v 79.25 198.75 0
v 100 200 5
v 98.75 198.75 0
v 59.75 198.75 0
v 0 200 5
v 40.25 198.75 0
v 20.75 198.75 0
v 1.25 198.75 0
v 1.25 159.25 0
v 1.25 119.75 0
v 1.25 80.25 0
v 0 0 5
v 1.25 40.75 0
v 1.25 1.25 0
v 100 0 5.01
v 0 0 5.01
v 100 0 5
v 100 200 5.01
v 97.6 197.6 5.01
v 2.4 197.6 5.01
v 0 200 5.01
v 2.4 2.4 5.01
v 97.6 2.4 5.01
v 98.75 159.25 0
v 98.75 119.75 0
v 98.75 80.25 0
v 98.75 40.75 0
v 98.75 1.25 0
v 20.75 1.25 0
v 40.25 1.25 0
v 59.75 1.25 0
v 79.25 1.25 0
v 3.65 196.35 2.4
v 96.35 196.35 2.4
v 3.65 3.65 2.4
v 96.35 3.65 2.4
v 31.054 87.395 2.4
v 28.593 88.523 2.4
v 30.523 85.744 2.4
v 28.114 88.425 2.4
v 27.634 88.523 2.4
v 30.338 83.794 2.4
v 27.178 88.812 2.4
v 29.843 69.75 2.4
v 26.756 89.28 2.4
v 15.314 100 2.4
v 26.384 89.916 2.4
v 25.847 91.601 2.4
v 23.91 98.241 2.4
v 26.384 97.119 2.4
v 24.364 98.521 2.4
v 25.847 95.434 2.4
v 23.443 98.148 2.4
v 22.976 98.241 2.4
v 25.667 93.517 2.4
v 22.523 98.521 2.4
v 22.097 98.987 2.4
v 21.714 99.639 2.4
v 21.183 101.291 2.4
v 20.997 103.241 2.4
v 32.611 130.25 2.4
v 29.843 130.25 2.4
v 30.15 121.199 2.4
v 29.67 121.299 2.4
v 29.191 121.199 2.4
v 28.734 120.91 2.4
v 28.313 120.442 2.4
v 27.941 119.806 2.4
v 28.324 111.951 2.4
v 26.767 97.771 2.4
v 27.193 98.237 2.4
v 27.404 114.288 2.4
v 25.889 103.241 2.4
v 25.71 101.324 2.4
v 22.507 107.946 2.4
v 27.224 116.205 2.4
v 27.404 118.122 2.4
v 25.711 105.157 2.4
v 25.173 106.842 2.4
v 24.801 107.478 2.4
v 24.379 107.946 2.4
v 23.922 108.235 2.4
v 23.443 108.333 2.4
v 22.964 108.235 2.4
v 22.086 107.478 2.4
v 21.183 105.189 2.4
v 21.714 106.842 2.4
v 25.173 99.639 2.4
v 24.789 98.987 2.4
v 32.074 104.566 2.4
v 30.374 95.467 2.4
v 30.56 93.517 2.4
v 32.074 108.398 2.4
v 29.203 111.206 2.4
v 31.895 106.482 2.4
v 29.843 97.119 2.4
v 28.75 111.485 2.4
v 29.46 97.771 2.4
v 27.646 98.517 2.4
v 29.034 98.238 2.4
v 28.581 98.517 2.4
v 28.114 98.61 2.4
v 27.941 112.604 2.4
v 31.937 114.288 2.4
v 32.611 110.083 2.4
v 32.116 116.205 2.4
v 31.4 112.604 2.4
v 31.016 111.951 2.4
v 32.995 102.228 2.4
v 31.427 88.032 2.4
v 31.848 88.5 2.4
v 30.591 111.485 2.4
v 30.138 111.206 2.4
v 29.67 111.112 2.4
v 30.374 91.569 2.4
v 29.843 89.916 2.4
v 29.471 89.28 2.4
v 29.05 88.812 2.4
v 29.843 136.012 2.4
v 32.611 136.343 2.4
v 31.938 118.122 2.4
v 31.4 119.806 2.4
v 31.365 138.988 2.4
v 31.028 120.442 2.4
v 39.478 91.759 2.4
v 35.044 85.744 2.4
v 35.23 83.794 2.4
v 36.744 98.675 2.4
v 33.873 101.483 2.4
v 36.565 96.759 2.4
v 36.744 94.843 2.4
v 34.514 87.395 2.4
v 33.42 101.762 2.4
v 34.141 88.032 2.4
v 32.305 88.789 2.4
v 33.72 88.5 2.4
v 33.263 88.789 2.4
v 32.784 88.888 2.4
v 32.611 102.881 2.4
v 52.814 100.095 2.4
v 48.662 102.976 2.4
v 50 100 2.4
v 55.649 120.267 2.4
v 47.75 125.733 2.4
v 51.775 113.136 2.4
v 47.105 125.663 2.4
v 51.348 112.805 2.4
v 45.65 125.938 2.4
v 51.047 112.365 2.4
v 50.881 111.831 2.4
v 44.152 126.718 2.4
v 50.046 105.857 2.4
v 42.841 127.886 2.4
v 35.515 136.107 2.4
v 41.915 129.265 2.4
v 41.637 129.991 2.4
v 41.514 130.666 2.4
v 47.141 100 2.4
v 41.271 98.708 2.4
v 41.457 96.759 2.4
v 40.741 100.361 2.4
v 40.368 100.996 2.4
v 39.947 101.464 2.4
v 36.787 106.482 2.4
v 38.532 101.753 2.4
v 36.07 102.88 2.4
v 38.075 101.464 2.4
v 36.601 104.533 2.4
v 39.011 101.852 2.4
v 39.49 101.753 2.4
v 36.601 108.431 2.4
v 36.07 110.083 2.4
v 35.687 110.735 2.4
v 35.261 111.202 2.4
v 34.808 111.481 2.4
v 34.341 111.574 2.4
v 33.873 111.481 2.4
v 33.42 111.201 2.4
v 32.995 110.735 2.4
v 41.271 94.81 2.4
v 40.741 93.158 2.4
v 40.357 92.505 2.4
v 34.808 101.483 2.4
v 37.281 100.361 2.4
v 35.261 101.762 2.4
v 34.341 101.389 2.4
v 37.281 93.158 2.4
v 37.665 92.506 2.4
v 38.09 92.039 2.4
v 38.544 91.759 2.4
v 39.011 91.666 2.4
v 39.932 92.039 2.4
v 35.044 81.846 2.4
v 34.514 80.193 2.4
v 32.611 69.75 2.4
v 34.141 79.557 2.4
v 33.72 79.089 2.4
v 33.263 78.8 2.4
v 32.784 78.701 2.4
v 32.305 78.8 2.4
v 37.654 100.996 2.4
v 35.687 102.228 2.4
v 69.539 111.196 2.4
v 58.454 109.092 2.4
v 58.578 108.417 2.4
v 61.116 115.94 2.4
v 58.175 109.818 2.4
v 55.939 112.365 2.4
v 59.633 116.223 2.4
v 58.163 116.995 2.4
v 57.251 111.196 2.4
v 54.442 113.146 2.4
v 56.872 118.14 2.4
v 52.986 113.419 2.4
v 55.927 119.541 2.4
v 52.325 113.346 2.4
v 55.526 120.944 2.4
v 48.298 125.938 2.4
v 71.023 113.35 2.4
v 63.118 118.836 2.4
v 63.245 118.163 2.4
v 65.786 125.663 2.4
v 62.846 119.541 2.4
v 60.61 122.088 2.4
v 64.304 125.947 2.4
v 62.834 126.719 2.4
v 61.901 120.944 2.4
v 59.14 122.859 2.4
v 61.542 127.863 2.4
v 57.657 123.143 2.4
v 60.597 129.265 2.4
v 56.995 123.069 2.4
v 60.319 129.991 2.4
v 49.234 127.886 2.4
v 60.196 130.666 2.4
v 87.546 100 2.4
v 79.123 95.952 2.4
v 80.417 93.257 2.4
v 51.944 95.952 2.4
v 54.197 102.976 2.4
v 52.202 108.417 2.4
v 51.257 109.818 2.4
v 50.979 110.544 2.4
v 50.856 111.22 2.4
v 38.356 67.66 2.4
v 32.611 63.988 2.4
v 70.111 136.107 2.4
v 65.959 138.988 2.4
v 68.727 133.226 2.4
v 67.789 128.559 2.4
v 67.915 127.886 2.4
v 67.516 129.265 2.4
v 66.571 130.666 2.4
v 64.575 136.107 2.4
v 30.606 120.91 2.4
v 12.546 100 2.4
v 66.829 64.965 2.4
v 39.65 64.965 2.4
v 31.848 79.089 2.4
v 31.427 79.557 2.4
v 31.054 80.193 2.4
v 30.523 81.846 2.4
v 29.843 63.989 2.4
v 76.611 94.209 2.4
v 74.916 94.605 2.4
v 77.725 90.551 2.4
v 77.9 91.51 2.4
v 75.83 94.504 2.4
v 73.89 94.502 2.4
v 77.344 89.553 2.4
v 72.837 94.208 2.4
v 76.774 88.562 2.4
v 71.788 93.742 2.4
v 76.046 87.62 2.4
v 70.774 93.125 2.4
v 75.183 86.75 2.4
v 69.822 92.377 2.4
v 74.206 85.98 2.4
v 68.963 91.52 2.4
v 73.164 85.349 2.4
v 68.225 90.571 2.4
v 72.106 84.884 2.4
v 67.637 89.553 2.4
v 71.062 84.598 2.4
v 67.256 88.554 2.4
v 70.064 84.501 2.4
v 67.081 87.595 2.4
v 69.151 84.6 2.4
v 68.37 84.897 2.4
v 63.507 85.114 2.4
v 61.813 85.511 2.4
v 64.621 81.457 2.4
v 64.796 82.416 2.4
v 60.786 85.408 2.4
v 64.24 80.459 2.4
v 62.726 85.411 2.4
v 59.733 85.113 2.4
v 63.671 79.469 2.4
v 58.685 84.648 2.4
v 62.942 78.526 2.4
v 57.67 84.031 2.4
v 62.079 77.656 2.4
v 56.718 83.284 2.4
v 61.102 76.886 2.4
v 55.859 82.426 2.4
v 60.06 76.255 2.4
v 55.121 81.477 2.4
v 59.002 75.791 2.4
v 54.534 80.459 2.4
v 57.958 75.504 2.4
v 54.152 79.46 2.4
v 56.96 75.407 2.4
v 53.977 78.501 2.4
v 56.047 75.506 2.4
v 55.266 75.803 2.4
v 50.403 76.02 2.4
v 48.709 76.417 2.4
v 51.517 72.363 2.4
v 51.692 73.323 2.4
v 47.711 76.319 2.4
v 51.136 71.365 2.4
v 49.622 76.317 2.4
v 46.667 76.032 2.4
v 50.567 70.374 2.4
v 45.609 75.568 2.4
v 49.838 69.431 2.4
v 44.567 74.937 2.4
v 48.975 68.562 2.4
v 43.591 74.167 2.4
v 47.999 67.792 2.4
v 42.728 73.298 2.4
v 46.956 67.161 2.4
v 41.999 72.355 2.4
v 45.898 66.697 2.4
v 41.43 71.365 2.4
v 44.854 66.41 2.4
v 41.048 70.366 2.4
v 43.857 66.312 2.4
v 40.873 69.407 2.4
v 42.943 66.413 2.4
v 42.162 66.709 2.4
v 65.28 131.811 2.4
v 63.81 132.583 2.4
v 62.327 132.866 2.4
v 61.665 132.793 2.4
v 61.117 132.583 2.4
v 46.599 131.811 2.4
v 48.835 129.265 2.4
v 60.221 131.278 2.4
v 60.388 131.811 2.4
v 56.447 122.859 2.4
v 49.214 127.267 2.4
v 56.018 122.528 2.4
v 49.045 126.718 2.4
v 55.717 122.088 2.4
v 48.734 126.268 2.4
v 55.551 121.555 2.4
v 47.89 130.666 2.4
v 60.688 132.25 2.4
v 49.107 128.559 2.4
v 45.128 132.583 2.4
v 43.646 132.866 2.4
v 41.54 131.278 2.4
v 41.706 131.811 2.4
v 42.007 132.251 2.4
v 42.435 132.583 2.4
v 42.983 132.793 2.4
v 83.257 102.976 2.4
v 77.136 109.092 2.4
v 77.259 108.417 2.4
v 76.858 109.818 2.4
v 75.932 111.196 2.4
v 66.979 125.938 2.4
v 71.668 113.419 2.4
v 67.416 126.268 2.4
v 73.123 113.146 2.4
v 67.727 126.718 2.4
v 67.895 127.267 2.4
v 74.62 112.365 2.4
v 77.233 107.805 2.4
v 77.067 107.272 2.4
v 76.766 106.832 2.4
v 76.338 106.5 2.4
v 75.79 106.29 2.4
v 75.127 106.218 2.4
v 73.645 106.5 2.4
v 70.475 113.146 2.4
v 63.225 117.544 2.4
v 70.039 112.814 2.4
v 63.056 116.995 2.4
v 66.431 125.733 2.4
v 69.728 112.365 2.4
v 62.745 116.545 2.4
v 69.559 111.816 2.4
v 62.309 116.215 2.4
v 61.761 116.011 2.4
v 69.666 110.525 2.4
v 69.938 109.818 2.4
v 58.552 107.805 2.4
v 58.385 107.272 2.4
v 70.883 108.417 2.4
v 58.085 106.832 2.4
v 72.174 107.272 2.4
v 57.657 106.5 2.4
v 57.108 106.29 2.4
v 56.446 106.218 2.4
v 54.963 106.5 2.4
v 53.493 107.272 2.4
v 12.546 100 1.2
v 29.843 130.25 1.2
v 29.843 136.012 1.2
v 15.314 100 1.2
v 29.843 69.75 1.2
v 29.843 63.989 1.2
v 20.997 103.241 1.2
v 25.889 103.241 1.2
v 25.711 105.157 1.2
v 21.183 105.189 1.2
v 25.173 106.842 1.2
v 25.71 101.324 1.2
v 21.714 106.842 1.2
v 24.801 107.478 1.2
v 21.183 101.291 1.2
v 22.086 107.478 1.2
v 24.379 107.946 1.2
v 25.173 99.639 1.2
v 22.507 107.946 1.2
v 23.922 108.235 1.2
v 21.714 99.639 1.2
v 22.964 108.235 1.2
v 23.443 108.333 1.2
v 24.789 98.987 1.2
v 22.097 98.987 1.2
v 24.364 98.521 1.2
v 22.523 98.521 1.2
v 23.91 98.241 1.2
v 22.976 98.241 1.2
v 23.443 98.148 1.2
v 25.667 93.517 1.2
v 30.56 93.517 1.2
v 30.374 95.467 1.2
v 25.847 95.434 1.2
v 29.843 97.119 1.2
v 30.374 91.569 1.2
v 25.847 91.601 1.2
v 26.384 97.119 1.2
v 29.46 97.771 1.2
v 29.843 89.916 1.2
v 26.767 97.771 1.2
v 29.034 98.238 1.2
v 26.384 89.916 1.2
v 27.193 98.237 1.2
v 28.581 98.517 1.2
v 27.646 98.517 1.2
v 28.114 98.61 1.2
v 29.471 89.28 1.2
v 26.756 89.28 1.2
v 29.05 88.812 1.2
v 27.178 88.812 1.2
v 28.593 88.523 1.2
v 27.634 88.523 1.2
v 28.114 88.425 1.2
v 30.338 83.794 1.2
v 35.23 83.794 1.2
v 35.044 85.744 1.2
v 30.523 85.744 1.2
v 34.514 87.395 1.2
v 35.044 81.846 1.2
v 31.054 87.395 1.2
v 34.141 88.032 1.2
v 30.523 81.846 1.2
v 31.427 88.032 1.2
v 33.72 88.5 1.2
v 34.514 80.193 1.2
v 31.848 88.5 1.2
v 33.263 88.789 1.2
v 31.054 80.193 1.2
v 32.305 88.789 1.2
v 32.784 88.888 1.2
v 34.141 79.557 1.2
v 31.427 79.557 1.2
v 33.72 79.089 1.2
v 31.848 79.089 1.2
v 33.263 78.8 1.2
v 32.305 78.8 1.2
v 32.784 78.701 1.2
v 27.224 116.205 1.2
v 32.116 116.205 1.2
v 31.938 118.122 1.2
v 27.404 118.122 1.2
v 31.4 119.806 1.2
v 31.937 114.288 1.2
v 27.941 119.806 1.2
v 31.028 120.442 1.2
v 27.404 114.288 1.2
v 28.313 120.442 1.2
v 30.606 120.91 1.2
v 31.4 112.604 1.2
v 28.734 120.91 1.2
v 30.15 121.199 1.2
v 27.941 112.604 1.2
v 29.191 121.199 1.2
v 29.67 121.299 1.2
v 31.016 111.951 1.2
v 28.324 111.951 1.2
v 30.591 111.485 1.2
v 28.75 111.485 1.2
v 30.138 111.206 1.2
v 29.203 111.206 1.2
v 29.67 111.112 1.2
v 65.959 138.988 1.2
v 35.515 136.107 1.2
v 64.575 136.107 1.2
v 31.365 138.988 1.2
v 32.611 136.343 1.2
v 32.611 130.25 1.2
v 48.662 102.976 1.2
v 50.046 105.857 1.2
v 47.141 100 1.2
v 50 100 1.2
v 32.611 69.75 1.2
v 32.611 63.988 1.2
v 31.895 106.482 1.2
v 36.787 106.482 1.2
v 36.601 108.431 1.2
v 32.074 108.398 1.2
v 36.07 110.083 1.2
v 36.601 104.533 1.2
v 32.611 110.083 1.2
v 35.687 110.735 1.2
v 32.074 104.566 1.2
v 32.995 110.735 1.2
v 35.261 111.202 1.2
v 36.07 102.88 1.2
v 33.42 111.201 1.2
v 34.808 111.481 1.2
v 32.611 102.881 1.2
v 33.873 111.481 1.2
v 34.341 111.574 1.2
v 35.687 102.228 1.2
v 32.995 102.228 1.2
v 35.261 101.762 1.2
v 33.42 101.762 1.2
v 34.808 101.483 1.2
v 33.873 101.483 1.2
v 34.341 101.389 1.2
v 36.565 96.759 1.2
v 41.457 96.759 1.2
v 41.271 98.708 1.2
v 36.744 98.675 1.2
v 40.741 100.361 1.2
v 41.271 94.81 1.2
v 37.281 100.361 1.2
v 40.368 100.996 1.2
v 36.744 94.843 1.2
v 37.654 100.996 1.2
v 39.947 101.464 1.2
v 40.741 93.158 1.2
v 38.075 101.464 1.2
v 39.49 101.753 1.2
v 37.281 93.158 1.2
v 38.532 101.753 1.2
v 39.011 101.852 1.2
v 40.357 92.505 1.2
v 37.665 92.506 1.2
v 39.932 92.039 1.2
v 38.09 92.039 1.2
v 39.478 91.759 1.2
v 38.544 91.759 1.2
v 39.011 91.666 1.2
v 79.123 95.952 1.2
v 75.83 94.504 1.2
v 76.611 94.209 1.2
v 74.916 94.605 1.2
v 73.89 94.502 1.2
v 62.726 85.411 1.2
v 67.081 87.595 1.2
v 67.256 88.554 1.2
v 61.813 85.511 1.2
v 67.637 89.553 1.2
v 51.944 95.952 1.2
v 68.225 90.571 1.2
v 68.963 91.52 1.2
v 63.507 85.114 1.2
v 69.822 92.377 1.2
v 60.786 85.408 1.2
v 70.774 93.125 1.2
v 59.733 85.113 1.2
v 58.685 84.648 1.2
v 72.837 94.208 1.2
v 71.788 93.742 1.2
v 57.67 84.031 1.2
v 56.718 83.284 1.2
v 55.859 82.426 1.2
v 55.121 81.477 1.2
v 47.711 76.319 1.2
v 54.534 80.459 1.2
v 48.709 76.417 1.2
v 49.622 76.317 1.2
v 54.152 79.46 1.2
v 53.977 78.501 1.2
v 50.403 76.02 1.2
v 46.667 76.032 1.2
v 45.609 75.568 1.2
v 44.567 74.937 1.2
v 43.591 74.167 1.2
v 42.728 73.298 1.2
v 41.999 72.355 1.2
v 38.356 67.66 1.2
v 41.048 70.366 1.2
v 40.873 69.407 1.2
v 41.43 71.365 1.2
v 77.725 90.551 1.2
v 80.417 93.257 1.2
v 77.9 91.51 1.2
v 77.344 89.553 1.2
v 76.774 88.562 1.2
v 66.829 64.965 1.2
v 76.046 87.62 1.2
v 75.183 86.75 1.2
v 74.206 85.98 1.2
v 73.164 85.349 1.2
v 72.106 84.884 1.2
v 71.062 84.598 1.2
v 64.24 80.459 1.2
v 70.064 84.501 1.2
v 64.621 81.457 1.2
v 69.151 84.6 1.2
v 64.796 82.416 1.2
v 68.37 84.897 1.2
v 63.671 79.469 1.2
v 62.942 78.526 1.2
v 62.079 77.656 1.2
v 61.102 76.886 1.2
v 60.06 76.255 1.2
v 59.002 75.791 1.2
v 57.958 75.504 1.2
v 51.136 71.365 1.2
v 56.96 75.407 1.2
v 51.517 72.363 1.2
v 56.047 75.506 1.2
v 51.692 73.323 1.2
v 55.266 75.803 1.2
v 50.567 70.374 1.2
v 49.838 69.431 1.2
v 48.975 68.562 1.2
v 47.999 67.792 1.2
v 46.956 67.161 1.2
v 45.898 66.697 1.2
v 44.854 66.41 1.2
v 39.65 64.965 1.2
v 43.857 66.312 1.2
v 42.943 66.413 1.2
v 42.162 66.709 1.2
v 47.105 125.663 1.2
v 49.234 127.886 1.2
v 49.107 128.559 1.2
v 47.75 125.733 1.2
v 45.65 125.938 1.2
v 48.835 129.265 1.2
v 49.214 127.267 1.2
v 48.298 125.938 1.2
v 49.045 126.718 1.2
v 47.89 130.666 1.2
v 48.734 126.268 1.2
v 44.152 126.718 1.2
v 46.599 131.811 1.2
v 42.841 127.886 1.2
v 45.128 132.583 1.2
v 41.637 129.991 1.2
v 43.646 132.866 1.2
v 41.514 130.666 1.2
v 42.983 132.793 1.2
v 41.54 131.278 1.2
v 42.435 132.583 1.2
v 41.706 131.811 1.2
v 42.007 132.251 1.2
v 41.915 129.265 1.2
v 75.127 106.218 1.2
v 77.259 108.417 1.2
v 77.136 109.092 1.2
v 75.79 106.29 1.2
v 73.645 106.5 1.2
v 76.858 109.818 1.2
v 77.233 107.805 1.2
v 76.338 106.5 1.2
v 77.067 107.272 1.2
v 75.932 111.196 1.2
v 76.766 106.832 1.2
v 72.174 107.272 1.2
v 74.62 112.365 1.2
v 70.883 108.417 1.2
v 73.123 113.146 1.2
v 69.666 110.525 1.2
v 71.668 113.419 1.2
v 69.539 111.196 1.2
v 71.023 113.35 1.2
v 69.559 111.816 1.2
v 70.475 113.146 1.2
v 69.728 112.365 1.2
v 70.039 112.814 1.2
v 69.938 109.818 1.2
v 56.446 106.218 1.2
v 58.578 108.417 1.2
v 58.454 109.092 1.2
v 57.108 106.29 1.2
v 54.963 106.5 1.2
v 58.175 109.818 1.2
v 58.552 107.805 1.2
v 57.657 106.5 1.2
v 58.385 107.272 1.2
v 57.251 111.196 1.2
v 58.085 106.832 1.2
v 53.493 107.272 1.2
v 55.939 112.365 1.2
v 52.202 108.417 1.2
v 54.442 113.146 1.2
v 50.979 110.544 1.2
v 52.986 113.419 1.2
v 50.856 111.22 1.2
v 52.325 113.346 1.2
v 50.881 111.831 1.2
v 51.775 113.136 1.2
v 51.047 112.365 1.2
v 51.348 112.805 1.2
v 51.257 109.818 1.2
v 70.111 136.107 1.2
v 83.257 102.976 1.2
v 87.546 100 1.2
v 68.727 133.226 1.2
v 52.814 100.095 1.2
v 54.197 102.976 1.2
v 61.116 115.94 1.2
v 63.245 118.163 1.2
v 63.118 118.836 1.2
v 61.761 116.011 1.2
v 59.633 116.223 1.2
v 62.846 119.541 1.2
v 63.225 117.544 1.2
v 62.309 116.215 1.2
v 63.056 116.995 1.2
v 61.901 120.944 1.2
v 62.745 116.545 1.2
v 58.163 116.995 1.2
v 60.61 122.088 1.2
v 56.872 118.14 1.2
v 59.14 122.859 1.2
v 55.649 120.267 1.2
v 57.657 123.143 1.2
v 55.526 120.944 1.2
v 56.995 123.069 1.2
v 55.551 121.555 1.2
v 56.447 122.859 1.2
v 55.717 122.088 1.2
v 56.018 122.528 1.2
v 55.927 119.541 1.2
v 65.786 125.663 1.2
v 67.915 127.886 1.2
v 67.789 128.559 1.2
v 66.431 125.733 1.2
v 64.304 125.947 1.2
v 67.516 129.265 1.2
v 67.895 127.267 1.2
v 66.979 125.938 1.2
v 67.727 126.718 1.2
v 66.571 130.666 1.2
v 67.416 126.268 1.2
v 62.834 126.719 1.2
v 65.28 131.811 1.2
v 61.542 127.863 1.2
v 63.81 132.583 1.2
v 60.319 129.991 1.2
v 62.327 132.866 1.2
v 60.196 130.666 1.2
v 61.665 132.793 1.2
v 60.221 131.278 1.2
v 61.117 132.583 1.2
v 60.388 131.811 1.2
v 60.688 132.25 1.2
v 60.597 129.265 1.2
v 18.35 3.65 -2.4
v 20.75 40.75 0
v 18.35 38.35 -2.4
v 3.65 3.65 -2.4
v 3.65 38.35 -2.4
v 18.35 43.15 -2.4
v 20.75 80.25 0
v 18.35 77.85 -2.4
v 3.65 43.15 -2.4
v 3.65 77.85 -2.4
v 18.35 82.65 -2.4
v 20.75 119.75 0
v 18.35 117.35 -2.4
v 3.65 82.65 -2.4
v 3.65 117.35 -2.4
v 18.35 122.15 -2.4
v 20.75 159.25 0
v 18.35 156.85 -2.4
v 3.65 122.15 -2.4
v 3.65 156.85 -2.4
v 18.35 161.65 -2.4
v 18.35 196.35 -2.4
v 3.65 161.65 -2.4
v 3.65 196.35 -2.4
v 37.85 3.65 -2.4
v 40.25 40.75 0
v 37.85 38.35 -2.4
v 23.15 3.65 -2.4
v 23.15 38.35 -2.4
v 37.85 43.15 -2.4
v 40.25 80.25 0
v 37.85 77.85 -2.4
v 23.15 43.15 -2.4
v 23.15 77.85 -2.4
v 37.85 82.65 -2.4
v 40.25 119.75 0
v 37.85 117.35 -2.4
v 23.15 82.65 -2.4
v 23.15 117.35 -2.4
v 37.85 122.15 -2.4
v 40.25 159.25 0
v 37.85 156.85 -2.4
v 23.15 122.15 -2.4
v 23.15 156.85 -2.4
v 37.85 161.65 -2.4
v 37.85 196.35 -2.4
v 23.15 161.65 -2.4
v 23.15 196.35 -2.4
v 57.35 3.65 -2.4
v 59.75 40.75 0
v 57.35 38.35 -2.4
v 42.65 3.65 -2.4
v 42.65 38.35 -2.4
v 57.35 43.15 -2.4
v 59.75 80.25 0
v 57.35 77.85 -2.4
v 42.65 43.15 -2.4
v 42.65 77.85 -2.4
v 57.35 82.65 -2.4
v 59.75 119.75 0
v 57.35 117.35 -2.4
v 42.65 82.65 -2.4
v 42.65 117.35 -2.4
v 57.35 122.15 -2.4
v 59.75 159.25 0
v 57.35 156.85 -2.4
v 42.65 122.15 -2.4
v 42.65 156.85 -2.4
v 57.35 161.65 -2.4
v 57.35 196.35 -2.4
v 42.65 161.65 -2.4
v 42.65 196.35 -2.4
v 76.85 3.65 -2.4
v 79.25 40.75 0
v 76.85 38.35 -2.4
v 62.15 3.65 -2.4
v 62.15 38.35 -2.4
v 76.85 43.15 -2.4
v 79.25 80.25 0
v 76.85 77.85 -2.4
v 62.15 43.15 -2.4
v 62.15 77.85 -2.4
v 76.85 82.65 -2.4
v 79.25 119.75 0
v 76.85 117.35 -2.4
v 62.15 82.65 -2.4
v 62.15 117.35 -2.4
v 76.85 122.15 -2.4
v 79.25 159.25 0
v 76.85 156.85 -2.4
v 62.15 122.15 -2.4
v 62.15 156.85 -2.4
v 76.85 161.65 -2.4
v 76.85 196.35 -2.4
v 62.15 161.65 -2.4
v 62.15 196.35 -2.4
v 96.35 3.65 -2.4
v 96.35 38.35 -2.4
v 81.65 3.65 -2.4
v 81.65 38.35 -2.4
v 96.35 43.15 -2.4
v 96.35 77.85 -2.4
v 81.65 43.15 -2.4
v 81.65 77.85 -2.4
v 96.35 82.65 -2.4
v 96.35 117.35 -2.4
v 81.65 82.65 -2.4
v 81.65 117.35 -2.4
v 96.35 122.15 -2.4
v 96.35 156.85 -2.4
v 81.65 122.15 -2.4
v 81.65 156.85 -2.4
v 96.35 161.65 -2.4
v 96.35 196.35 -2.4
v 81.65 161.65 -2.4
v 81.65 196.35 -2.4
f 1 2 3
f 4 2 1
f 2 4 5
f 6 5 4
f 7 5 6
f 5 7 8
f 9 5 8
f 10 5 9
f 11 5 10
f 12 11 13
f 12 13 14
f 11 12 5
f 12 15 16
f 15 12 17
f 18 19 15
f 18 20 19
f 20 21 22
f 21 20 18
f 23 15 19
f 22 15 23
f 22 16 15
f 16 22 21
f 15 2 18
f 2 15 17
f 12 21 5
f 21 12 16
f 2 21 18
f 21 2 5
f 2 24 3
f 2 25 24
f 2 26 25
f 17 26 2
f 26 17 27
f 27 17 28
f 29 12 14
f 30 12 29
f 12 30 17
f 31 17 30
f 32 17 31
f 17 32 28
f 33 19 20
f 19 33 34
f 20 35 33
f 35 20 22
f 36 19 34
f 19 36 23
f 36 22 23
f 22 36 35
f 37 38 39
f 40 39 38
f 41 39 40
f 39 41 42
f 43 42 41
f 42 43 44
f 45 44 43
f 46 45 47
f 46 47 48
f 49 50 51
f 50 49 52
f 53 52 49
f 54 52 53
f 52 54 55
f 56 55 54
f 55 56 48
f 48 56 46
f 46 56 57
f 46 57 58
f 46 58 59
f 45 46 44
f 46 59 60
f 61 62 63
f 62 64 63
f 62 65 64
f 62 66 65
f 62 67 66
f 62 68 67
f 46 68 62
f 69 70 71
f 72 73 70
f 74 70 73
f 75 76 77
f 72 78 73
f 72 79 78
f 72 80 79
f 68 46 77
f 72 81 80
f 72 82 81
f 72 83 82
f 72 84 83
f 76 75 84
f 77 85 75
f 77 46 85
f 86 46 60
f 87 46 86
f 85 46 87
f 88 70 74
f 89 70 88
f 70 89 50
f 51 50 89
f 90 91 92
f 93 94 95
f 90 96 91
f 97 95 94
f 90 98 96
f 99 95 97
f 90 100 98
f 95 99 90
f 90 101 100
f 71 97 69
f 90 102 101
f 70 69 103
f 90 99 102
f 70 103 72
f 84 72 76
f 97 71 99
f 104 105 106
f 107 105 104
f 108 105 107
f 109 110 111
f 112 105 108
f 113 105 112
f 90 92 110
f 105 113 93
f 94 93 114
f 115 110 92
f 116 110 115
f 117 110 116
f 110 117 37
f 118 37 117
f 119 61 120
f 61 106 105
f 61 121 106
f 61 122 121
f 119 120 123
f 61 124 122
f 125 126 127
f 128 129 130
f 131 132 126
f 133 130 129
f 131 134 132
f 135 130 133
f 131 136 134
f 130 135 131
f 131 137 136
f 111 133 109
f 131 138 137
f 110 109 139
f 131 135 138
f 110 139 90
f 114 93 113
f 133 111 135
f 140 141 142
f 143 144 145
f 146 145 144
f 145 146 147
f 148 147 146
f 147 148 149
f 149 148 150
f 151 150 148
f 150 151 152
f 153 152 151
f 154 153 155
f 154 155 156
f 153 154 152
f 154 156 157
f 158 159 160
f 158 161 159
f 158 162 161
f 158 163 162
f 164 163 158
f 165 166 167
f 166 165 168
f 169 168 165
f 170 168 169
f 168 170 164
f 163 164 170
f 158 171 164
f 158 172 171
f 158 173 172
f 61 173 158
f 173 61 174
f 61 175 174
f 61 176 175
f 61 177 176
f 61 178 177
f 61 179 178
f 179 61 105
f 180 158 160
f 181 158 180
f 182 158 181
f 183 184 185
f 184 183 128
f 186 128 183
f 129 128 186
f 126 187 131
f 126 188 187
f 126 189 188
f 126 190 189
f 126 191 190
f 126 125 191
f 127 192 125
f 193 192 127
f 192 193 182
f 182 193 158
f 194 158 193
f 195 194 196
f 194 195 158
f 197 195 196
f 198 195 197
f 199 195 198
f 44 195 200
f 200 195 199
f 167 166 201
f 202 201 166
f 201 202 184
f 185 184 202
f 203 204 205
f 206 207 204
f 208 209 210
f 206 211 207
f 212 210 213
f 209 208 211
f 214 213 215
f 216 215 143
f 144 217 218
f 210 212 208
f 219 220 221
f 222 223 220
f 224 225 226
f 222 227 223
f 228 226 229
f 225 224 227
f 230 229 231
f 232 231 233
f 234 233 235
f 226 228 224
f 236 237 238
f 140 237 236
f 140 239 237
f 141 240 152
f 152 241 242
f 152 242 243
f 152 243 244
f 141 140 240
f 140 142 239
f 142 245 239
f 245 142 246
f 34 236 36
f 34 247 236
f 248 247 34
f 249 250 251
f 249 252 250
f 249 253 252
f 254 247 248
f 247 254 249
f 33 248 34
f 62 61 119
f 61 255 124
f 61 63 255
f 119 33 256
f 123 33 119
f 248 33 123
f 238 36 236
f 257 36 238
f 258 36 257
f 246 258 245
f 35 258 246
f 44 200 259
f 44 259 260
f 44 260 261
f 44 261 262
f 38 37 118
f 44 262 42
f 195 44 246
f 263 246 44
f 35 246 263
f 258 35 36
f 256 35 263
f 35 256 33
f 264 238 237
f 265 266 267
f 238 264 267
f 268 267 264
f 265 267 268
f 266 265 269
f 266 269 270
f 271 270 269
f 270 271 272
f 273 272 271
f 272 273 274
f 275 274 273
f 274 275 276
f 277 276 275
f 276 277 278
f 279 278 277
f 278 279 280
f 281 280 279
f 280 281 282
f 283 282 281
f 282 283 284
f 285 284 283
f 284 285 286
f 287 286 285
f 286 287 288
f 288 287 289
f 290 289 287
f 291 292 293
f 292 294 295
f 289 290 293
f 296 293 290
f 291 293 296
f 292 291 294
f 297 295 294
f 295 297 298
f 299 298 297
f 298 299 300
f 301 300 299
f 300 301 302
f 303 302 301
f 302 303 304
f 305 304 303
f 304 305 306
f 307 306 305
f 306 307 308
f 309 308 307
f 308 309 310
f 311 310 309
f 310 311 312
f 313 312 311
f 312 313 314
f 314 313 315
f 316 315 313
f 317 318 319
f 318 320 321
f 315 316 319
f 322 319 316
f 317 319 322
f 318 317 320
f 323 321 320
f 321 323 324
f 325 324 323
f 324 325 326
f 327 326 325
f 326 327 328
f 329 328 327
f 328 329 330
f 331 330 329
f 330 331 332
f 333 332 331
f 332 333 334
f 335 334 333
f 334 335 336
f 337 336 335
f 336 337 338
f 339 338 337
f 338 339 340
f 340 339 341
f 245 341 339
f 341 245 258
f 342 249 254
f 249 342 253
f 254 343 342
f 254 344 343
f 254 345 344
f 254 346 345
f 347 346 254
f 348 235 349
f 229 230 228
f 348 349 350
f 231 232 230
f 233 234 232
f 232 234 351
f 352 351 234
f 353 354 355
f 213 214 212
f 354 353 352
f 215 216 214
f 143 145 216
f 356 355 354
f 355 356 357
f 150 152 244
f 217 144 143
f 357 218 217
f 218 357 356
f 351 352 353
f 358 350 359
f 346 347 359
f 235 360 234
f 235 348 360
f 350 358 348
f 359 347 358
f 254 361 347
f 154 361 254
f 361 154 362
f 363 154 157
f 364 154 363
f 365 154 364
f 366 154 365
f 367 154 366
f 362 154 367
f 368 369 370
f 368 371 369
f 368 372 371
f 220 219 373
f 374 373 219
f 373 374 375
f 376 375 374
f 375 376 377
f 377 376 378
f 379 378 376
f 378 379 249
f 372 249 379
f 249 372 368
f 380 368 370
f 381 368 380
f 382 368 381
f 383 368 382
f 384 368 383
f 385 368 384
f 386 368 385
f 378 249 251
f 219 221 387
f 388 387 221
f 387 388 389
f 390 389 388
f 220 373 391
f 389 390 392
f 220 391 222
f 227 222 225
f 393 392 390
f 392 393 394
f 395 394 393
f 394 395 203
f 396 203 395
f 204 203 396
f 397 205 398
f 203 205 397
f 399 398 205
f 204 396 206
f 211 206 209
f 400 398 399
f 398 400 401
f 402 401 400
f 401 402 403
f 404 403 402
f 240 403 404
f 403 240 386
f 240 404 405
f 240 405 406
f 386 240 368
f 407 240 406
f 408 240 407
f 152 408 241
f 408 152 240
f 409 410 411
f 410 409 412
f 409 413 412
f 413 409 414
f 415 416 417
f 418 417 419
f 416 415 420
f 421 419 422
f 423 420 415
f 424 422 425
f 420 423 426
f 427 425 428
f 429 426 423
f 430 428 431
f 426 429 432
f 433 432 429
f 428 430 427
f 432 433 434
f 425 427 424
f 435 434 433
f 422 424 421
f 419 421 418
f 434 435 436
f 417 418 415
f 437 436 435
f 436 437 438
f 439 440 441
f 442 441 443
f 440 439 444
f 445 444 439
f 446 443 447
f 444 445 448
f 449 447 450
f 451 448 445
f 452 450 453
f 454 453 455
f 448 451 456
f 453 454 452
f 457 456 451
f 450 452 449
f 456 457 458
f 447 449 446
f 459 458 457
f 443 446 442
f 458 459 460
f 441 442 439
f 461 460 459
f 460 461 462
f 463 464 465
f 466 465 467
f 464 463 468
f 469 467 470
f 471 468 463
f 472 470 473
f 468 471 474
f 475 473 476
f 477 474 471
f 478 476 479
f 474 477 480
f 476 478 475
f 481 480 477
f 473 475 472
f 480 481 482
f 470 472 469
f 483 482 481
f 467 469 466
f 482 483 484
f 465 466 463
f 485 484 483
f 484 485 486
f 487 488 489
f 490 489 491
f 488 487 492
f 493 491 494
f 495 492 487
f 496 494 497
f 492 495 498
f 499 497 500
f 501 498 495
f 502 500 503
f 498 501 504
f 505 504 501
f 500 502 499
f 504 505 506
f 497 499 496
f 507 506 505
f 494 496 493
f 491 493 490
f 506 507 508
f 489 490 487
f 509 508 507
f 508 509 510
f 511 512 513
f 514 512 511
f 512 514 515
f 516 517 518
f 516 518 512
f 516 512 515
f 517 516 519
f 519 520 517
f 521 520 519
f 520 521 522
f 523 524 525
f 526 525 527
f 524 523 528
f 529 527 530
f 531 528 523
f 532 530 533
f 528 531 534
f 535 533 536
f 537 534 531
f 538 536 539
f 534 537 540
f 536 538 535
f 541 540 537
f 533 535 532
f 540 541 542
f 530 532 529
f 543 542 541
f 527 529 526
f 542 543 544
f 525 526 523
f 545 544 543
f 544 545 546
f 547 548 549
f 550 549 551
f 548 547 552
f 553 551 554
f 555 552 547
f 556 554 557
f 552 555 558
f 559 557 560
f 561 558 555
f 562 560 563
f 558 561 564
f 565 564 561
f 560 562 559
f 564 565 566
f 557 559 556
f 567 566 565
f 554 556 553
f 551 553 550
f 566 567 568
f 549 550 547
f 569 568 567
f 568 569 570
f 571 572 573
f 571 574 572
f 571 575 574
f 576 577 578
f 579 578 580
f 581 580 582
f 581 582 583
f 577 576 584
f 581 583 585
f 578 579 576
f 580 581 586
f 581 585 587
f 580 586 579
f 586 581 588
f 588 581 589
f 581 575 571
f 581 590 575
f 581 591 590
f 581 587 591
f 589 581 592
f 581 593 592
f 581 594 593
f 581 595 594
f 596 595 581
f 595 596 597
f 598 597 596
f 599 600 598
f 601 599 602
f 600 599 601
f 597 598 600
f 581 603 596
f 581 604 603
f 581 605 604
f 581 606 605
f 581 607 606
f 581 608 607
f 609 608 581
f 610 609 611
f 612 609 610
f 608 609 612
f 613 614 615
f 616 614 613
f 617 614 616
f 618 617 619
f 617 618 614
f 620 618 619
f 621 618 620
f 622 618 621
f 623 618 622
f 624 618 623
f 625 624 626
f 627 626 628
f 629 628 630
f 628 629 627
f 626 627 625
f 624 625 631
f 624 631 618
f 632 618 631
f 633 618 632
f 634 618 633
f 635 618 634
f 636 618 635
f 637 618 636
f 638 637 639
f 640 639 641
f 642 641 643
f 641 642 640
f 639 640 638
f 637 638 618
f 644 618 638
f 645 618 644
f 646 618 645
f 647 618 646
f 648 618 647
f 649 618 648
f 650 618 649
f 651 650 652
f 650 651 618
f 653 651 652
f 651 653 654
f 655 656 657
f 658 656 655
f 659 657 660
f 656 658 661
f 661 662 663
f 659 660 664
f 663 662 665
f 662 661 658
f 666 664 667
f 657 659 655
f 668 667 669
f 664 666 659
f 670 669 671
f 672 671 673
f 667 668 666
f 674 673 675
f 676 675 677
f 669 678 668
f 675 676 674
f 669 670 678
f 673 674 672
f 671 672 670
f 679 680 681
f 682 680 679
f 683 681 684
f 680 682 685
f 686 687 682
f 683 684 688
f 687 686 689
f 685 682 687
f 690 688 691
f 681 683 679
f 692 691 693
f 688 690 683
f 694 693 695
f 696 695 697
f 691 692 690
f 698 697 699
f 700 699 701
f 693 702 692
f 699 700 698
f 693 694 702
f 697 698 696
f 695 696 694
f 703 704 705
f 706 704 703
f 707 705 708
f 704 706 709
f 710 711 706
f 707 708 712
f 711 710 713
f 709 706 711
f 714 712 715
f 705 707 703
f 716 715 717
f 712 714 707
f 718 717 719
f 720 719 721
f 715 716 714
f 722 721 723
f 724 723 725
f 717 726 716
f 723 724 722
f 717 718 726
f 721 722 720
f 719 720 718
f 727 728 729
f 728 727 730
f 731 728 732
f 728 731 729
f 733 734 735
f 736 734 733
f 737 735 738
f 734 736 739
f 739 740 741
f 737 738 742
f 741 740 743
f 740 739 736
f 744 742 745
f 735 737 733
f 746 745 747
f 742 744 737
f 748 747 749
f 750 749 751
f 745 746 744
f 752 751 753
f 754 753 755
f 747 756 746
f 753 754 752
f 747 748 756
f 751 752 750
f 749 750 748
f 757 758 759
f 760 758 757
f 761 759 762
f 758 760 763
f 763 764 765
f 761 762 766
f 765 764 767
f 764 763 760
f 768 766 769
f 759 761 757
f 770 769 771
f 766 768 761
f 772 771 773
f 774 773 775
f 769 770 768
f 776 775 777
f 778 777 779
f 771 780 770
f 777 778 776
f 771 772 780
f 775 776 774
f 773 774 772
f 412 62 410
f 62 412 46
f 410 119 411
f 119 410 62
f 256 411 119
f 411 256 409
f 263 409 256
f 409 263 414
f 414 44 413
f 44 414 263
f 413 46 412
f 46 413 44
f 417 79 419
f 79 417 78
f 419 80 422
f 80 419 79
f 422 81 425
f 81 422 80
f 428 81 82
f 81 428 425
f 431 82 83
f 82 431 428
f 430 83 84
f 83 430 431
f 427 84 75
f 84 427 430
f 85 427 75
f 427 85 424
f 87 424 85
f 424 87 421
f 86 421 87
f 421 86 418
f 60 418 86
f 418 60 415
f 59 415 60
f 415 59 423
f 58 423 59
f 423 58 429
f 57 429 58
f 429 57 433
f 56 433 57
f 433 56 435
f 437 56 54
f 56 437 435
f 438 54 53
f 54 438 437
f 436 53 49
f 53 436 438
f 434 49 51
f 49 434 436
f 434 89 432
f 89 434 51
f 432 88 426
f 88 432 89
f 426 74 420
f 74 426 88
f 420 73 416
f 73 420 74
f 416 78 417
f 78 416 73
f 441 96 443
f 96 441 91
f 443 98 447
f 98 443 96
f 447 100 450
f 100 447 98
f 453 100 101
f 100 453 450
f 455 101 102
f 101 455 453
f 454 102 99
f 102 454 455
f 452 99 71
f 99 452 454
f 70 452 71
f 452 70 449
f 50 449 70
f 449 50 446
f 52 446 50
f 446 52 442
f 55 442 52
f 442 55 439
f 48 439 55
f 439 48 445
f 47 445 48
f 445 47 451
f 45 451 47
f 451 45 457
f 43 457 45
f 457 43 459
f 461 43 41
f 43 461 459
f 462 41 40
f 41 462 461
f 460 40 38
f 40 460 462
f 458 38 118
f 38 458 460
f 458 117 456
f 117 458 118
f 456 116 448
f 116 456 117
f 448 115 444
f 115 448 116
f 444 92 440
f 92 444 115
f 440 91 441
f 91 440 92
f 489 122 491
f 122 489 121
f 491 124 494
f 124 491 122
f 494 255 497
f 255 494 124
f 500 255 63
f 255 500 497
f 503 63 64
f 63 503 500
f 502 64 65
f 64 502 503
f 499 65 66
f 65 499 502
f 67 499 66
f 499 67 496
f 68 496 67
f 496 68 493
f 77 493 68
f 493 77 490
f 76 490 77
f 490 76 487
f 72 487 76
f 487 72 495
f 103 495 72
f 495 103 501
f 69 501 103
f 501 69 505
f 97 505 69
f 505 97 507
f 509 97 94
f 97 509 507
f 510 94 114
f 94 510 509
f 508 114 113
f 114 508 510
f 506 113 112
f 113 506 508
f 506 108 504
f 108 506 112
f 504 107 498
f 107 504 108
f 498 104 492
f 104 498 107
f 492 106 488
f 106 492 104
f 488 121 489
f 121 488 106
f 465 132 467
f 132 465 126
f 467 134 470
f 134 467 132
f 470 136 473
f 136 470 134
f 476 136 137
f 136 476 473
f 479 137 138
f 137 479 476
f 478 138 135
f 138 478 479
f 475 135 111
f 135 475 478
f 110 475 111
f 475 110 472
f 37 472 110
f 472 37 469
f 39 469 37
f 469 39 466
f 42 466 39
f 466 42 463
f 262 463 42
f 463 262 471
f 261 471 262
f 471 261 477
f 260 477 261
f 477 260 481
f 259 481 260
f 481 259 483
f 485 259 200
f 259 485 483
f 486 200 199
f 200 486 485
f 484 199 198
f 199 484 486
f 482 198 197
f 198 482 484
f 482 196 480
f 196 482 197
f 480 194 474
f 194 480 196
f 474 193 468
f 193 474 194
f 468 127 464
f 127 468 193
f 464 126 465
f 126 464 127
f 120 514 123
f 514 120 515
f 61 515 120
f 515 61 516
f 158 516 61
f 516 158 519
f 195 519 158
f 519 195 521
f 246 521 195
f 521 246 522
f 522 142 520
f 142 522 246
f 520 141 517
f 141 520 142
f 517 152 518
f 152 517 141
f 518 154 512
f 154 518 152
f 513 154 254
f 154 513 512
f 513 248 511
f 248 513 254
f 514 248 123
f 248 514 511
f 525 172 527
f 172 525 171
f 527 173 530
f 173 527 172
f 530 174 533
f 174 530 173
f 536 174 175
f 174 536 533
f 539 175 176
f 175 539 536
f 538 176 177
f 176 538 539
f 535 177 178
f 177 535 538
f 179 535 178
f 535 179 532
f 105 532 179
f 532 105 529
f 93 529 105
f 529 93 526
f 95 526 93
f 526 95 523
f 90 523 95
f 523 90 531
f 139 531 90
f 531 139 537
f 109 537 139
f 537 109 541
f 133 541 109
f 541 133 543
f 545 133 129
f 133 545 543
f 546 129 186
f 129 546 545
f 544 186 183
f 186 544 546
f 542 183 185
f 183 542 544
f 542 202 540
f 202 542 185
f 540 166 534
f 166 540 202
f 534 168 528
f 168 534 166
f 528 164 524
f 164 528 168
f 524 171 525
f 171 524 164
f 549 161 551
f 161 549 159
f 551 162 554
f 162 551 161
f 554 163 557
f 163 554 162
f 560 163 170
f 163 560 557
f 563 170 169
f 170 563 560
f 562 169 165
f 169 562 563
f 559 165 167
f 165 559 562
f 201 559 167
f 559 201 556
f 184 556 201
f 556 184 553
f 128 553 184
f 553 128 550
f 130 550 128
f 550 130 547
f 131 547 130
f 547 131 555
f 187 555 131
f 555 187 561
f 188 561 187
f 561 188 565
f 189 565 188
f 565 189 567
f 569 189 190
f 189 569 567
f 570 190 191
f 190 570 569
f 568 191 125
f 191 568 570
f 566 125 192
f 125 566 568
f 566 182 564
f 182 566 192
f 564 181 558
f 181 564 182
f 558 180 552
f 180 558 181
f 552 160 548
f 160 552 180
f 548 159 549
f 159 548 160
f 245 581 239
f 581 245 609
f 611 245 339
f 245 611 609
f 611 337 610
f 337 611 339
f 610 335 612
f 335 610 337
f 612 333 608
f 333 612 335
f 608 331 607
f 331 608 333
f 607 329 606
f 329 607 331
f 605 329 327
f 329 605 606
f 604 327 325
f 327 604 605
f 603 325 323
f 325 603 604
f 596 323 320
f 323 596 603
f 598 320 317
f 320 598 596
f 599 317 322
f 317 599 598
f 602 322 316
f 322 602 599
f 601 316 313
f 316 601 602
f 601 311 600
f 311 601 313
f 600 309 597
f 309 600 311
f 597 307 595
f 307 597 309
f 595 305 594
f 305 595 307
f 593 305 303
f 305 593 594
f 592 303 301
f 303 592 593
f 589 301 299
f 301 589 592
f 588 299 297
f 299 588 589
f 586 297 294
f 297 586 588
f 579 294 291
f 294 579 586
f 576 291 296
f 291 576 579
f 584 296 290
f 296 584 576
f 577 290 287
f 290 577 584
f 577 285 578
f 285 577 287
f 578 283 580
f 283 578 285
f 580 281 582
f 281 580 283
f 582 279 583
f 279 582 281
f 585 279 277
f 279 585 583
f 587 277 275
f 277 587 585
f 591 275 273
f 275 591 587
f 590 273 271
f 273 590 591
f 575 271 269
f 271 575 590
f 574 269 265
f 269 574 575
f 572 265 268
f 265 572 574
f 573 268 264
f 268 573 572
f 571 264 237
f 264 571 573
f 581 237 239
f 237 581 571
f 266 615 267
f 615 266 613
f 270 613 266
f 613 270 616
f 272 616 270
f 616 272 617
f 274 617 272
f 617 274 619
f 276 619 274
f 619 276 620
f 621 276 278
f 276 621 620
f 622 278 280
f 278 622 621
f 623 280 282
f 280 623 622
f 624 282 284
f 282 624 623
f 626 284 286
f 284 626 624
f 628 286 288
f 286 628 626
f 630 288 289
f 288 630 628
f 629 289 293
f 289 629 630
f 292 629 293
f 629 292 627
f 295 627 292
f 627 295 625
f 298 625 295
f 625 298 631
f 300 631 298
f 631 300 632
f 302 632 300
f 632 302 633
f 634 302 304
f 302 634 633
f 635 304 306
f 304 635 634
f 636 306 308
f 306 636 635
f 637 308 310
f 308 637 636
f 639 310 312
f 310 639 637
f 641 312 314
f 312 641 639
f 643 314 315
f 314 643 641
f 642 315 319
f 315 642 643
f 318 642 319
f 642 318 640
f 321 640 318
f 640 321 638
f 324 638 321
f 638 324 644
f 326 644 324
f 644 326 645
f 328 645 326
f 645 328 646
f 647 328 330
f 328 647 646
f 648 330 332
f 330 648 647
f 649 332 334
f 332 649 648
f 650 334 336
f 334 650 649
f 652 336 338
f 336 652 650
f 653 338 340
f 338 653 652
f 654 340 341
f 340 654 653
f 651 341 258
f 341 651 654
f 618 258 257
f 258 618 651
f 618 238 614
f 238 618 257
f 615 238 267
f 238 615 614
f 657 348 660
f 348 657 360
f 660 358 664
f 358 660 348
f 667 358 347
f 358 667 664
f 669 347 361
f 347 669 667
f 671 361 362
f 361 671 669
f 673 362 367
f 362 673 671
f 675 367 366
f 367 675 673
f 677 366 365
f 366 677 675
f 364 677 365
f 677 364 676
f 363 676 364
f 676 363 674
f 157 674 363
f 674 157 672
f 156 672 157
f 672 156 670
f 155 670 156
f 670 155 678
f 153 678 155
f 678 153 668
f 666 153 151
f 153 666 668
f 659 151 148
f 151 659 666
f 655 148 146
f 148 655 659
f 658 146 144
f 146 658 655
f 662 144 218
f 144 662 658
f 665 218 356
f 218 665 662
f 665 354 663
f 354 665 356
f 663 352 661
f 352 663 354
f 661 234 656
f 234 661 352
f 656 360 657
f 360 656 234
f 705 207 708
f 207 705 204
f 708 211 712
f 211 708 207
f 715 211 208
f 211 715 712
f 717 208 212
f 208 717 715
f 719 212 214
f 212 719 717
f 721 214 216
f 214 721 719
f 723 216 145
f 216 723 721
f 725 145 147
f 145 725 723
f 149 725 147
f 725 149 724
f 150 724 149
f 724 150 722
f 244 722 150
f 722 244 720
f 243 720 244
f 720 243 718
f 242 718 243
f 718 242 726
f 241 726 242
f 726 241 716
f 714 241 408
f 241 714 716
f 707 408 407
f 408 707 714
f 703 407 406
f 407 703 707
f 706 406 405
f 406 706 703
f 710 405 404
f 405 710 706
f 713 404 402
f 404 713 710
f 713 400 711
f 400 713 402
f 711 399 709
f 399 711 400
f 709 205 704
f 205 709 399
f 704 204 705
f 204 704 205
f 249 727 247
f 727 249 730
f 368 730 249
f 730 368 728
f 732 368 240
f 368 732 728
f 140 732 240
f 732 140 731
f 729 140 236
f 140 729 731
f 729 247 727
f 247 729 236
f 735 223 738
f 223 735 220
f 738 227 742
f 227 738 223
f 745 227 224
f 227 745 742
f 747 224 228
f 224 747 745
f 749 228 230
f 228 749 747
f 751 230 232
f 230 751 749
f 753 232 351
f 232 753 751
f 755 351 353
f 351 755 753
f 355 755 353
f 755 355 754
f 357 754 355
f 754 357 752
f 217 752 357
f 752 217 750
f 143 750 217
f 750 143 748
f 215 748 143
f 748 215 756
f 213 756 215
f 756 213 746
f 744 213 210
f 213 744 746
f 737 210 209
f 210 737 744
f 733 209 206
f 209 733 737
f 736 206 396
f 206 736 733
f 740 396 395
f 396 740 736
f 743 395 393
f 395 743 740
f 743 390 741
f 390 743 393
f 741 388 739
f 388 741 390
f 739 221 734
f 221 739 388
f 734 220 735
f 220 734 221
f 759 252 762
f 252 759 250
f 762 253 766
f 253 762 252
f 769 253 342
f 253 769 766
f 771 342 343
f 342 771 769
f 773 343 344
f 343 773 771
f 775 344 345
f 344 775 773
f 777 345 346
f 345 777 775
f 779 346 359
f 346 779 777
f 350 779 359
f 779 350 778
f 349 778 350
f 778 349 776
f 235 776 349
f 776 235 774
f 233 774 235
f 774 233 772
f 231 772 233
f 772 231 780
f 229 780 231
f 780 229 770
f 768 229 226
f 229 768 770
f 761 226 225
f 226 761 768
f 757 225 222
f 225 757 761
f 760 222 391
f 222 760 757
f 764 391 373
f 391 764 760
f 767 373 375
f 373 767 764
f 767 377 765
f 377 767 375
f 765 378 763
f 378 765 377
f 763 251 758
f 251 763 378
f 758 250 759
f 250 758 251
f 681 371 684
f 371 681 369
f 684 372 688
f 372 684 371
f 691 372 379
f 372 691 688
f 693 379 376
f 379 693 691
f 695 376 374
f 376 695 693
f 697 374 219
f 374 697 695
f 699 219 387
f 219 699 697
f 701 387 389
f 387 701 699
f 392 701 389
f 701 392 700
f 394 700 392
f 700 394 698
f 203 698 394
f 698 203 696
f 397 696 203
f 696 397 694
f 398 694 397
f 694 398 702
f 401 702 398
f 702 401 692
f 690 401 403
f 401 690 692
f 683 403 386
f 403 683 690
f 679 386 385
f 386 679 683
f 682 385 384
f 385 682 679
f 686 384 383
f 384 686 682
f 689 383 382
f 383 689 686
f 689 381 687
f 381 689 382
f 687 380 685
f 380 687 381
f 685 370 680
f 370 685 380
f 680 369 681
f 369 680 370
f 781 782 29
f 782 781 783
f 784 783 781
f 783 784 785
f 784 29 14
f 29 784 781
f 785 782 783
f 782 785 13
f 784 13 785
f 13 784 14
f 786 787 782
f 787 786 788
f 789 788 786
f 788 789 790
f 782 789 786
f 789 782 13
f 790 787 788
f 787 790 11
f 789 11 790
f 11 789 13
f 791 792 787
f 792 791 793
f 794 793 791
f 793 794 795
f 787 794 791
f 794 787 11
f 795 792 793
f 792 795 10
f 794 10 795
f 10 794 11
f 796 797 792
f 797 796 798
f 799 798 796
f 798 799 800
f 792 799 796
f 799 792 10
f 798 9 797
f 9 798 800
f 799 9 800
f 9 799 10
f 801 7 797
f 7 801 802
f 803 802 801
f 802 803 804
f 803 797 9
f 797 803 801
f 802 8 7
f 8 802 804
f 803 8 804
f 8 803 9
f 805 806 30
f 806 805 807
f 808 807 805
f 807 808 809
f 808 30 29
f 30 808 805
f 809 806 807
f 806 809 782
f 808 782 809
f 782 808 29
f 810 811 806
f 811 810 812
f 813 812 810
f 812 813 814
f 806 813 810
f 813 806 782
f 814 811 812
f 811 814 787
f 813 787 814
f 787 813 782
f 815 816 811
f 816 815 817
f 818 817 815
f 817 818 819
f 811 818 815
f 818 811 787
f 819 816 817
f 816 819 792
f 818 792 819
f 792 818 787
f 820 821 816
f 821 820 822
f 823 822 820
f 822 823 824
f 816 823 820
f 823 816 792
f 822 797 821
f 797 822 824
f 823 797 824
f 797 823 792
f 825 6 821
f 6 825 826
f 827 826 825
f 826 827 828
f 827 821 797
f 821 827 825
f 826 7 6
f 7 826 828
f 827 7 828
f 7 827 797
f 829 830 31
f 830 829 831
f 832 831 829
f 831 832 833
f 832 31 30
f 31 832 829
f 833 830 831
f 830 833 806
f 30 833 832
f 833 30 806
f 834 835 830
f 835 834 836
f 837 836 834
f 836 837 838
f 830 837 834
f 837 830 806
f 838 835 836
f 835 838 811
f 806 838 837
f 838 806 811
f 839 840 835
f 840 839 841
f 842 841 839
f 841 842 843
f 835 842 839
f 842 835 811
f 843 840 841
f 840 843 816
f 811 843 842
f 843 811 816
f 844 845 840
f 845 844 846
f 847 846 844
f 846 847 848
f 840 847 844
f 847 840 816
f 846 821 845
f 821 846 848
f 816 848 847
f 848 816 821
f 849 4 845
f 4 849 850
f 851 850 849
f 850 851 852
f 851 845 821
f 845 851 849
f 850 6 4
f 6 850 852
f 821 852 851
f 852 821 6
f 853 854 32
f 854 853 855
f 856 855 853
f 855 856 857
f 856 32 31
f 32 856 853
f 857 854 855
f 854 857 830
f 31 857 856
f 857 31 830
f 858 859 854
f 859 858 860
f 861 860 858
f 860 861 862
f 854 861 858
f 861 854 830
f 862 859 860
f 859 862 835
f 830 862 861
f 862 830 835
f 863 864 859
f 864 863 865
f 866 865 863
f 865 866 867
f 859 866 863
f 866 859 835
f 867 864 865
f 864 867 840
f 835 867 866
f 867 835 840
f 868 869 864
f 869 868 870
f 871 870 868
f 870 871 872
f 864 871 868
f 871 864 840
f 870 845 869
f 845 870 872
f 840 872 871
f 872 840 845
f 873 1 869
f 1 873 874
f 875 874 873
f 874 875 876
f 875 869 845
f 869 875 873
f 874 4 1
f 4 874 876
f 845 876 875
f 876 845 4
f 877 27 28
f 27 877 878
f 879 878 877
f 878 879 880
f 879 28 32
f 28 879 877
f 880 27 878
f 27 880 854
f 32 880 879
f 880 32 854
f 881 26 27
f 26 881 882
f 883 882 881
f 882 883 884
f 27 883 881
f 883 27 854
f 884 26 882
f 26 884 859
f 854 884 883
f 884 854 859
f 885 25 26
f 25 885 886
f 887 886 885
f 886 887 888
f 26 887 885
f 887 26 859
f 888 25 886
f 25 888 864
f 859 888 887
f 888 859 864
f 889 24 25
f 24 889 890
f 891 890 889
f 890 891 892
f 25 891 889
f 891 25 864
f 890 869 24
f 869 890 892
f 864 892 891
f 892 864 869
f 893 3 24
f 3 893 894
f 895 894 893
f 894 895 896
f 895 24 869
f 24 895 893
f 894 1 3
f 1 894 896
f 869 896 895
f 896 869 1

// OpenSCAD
$fa=4; // default minimum facet angle is now 4
$fs=0.05; // default minimum facet size is now 0.05 mm

width = 100;
length = 200;
height = 5;

wallThickness = 2.4;

union() {
  difference() {
    hull() {
      translate([height / 4, height / 4, 0]) cube([width - height / 2, length - height / 2, 0.01]);
      translate([0, 0, height]) cube([width, length, 0.01]);
    }

    hull() {
      translate([height / 4 + wallThickness, height / 4 + wallThickness, wallThickness]) cube([width - height / 2 - (2 * wallThickness), length - height / 2 - (2 * wallThickness), 0.01]);
      translate([wallThickness, wallThickness, height + 0.01]) cube([width - (2 * wallThickness), length - (2 * wallThickness), 0.01]);
    }

    #translate([width / 2, length / 2, wallThickness / 2]) resize([width * .75, width * .75]) rotate([0, 0, 90]) translate([-50, -50]) linear_extrude(wallThickness / 2 + .01) import("../personal/LogoExtrude.dxf", layer="final");
  }

  fifthWidth = (width - height / 2) / 5;
  fifthLength = (length - height / 2) / 5;
  translate([height / 4, height / 4, 0]) {
    for(x = [0:fifthWidth:fifthWidth*4]) {
      for (y = [0:fifthLength:fifthLength*4]) {
        translate([x, y, 0]) hull(){
          cube([fifthWidth, fifthLength, 0.01]);
          translate([wallThickness, wallThickness, -wallThickness]) cube([(fifthWidth) - (wallThickness*2), (fifthLength) - (wallThickness*2), 0.01]);
        }
      }
    }
  }
}
